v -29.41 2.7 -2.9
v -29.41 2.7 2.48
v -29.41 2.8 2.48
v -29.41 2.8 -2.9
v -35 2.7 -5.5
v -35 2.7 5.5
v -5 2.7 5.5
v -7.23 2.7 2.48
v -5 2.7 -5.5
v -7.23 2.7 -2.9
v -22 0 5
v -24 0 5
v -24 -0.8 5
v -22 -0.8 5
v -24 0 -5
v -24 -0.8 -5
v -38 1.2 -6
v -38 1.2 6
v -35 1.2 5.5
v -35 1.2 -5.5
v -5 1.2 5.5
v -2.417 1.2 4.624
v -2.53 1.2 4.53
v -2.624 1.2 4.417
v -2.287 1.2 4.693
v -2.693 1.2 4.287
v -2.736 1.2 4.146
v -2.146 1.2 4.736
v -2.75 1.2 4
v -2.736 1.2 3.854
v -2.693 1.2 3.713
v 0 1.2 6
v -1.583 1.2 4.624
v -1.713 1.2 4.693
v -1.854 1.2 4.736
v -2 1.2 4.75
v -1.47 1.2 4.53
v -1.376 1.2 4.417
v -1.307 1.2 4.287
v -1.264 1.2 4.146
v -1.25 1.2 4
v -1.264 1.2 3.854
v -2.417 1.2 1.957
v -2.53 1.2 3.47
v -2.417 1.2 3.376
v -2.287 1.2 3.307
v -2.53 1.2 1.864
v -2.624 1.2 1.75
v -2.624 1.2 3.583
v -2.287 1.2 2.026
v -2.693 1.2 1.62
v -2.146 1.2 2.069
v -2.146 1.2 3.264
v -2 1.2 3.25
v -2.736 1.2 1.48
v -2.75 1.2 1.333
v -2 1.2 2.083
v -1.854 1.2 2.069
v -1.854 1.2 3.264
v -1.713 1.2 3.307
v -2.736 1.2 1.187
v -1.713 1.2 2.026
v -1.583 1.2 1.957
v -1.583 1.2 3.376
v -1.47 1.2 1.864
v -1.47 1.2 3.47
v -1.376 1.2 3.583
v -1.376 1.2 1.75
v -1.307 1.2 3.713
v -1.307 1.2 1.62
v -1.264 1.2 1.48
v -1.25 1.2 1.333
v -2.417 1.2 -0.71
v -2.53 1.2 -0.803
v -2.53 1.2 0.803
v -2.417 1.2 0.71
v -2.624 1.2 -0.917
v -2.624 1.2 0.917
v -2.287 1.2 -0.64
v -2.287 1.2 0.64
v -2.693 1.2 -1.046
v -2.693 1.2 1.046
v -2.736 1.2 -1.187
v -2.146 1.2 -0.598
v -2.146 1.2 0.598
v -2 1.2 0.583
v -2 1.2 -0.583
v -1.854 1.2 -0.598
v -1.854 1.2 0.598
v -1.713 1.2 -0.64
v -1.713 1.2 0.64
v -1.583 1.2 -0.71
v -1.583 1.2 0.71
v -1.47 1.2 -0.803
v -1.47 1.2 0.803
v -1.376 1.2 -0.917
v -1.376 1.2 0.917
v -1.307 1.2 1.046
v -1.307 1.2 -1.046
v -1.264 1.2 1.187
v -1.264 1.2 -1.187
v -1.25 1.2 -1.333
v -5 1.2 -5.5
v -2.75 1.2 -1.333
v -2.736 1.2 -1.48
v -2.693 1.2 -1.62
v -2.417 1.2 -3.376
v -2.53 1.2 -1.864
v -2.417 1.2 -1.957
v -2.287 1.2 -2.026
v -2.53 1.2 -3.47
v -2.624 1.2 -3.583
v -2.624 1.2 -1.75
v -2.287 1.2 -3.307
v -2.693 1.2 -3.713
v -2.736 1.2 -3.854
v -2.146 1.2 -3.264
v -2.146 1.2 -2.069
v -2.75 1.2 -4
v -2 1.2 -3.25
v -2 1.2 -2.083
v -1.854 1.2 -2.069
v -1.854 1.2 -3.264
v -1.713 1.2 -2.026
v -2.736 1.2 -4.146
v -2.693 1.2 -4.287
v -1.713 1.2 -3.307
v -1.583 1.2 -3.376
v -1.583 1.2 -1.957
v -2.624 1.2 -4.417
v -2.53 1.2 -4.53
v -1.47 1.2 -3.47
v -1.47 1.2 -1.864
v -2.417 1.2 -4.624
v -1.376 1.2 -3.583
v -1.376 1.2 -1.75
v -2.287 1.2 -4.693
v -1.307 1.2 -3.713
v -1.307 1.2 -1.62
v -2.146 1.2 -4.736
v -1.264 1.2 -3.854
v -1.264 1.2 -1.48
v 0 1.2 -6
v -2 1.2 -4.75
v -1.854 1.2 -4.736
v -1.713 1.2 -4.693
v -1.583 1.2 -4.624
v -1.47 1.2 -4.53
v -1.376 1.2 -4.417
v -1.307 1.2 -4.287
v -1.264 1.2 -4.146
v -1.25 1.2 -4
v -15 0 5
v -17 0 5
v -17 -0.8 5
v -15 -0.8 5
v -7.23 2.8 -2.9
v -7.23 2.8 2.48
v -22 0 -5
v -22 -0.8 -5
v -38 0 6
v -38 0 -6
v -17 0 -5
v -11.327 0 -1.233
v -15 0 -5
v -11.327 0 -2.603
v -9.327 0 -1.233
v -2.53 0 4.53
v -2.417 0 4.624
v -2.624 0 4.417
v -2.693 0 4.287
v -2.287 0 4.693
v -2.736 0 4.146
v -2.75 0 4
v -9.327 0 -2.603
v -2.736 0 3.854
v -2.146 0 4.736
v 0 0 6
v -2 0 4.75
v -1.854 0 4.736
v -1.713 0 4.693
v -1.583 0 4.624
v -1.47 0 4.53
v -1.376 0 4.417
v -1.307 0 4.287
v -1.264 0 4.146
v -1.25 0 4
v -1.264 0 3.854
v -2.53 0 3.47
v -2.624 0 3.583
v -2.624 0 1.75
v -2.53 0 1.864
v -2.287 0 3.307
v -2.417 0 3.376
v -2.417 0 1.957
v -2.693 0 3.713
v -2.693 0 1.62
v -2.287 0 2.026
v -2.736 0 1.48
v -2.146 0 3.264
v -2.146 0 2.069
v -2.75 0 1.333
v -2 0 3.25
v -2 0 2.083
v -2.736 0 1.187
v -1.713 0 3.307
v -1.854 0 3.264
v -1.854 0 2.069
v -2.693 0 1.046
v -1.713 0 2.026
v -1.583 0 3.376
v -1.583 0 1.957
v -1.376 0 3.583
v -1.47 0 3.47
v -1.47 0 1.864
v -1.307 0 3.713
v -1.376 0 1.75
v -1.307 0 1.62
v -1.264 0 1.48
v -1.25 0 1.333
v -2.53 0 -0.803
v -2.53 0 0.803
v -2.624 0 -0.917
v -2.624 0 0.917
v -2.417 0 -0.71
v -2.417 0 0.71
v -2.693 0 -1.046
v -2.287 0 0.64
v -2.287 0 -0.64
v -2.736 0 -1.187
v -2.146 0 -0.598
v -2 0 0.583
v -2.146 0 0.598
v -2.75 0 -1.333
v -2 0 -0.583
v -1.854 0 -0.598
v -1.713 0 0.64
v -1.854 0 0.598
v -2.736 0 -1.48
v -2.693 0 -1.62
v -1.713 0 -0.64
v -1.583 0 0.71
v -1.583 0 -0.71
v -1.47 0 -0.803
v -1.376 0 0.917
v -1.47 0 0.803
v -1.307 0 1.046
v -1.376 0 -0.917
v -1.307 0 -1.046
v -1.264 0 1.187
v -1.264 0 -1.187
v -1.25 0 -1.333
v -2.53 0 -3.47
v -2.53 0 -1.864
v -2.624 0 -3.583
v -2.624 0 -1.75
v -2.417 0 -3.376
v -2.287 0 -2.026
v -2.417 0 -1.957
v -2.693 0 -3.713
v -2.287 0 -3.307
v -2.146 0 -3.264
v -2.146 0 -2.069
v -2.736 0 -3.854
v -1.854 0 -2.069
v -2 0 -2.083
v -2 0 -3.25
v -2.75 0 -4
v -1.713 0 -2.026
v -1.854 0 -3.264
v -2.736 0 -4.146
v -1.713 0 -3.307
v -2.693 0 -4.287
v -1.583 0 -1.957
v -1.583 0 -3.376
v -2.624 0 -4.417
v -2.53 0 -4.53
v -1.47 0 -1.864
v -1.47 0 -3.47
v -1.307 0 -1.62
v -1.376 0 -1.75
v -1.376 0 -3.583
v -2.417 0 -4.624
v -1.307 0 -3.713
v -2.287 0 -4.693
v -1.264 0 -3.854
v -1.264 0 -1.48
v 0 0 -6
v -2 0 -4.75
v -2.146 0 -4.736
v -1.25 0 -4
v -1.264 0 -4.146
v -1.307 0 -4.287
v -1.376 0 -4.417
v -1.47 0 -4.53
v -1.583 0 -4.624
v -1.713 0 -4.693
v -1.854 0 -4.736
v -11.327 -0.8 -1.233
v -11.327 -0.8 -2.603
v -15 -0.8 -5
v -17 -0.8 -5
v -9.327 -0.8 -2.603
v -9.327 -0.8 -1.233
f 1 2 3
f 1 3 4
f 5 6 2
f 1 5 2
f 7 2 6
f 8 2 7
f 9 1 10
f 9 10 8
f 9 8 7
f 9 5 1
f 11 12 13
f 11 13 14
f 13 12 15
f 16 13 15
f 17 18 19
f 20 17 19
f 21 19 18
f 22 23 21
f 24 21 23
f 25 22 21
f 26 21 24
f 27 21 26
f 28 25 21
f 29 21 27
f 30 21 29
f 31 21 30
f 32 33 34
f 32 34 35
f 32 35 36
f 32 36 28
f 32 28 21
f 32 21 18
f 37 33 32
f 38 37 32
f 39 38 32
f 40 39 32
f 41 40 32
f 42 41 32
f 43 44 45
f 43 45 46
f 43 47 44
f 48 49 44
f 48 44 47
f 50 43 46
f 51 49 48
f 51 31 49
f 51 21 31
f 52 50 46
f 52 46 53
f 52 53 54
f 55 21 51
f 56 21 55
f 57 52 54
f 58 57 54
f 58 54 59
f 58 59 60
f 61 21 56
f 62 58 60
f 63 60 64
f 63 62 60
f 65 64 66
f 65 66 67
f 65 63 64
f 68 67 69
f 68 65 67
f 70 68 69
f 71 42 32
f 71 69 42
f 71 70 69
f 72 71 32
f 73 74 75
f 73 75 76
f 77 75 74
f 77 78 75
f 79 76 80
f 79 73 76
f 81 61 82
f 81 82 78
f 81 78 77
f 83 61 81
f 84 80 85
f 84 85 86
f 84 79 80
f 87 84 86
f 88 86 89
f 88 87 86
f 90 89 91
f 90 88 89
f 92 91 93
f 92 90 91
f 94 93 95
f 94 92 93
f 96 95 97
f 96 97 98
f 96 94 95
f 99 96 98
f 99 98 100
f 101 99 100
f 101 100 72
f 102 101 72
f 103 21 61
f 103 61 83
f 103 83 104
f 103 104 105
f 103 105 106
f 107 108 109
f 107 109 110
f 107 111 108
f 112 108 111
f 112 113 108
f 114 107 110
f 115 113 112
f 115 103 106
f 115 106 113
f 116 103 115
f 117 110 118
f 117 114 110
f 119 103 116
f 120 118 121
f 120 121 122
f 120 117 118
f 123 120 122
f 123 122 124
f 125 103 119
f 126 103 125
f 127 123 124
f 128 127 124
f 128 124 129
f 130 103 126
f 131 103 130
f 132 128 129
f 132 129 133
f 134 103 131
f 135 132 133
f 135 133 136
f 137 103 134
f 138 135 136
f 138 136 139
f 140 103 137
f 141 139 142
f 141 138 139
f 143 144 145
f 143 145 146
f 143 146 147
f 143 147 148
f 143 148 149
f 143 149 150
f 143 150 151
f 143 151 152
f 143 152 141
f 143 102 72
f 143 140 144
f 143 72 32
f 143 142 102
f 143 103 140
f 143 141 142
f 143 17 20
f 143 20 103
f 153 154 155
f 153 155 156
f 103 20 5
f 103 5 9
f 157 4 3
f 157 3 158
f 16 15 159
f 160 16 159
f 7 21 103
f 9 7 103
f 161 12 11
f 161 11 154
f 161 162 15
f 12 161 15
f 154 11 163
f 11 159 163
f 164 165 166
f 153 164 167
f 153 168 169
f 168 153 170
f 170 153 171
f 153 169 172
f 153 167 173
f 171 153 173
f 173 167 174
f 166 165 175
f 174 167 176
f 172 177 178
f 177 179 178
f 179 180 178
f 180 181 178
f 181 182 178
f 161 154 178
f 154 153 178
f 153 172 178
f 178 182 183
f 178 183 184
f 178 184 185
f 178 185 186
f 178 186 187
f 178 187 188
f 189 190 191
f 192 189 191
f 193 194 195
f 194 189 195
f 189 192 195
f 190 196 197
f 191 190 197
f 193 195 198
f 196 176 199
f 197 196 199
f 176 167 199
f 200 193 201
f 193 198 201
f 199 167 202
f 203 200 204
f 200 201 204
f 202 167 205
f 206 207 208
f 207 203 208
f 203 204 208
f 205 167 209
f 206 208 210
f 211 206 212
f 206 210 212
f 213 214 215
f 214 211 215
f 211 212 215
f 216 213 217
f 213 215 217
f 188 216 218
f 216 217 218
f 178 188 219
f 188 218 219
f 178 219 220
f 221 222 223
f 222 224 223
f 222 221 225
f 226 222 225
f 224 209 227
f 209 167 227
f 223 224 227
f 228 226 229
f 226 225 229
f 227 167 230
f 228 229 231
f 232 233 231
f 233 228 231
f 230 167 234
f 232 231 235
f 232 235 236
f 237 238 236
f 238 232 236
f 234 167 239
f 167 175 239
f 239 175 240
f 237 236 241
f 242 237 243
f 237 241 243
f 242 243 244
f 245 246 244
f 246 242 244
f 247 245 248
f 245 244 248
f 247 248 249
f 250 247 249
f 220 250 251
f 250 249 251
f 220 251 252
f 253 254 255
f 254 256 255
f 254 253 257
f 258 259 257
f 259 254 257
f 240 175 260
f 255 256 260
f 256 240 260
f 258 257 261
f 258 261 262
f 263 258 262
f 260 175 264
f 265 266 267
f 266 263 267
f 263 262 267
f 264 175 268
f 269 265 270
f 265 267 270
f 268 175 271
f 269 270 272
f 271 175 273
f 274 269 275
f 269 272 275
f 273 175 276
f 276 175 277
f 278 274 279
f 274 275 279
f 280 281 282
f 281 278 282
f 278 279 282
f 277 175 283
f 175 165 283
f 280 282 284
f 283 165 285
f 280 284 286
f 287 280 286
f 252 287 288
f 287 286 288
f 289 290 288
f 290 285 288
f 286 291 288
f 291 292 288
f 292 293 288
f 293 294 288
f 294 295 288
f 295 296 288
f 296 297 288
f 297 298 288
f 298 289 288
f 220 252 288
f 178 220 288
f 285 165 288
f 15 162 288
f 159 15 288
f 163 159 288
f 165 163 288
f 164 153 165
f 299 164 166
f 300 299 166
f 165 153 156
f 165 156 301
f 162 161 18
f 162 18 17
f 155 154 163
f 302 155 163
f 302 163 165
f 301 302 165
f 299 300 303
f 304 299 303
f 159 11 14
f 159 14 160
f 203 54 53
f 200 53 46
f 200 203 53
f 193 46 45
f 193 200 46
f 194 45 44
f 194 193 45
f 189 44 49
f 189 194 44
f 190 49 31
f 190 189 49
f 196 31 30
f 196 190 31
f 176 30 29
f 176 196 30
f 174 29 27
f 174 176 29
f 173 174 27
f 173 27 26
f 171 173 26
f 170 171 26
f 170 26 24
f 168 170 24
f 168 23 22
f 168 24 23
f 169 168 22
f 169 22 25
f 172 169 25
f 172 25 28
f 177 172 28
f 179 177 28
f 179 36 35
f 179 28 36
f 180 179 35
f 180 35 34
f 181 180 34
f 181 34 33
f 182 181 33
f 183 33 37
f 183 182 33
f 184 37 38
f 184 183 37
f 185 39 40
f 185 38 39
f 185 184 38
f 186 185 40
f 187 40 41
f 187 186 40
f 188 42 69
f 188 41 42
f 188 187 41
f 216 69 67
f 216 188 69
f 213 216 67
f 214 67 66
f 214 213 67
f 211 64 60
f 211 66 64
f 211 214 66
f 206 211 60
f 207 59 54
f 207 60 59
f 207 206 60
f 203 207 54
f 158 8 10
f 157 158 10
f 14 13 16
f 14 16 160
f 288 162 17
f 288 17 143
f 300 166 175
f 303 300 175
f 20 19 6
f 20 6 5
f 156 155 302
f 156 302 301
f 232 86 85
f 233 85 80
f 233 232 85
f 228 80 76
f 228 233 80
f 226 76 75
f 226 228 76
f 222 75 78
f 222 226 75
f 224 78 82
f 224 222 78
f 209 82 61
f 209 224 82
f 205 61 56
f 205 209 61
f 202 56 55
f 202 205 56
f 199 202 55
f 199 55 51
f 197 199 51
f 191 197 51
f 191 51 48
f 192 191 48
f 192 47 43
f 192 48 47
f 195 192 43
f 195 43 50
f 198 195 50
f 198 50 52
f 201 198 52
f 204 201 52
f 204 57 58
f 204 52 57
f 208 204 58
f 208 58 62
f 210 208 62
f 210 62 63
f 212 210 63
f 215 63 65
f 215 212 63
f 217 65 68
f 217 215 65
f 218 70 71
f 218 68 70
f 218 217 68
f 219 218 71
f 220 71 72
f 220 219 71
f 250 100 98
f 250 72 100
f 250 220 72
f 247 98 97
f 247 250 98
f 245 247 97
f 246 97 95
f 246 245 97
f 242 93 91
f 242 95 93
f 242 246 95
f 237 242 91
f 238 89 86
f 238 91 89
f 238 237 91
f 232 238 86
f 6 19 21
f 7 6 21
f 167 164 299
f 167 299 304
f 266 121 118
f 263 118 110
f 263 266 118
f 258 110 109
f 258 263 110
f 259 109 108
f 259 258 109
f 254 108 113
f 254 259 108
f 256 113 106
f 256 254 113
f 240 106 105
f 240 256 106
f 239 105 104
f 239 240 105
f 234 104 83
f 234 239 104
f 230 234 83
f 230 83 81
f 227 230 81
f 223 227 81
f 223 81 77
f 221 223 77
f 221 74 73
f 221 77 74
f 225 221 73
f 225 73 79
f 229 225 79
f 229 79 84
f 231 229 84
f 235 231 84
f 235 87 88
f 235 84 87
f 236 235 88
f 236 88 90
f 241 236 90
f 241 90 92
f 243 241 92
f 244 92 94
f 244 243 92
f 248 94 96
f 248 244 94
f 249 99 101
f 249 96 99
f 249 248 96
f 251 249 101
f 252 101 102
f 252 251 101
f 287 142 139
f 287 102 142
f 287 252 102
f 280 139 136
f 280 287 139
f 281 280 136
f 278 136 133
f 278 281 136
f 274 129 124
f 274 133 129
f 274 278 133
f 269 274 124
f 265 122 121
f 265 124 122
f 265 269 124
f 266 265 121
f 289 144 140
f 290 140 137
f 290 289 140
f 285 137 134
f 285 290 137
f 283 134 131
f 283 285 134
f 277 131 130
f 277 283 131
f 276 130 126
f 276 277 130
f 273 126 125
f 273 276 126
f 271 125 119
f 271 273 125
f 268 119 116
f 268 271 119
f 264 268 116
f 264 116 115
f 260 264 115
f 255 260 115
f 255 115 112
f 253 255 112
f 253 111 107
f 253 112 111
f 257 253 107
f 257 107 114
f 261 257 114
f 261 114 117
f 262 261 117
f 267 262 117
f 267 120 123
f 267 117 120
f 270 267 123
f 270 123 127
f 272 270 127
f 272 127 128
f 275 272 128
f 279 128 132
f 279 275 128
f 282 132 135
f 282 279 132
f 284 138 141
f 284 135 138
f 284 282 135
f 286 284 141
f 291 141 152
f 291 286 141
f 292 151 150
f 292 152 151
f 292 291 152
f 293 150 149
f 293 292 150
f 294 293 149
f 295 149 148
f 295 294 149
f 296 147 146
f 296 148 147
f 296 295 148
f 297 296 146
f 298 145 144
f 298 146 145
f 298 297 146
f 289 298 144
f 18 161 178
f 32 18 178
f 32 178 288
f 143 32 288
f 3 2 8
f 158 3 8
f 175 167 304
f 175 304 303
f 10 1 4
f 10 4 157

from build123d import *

# Parameters (mm, degrees)
SKETCH_1_W          = 38
SKETCH_1_H          = 12
EXTRUDE_1_DEPTH     = 1.2
SKETCH_2_W          = 30
SKETCH_2_H          = 11
EXTRUDE_2_DEPTH     = 2.7
SKETCH_3_R          = 0.75
CUT_EXTRUDE_2_DEPTH = 39.565399
EXTRUDE_START       = 1.2
SKETCH_4_W          = 2
SKETCH_4_H          = 10
SKETCH_4_H_2        = 1.370131764
EXTRUDE_3_DEPTH     = 2
SKETCH_5_W          = 22.18
SKETCH_5_H          = 5.38
EXTRUDE_4_DEPTH     = 0.1


with BuildPart() as part:
    # Эскиз1 → Бобышка-Вытянуть1 (new body)
    with BuildSketch(Plane(origin=(0, 0, 0), x_dir=(1, 0, 0), z_dir=(0, 1, 0))):
        with Locations((-19, 0)):
            Rectangle(SKETCH_1_W, SKETCH_1_H)
    extrude(amount=EXTRUDE_1_DEPTH)

    # Эскиз2 → Бобышка-Вытянуть2 (add)
    with BuildSketch(Plane(origin=(0, 0, 0), x_dir=(1, 0, 0), z_dir=(0, 1, 0))):
        with Locations((-20, 0)):
            Rectangle(SKETCH_2_W, SKETCH_2_H)
    extrude(amount=EXTRUDE_2_DEPTH)

    # Эскиз3 → Вырез-Вытянуть2 (cut, through all)
    with BuildSketch(Plane(origin=(0, 0, 0), x_dir=(1, 0, 0), z_dir=(0, 1, 0))):
        with Locations(Location((-2, 4, 0), (0, 0, 90))):
            Circle(SKETCH_3_R)
        with Locations(Location((-2, 1.333333333, 0), (0, 0, 90))):
            Circle(SKETCH_3_R)
        with Locations(Location((-2, -1.333333333, 0), (0, 0, 90))):
            Circle(SKETCH_3_R)
        with Locations(Location((-2, -4, 0), (0, 0, 90))):
            Circle(SKETCH_3_R)
    extrude(amount=CUT_EXTRUDE_2_DEPTH, mode=Mode.SUBTRACT)

    # Эскиз4 → Бобышка-Вытянуть3 (add)
    with BuildSketch(Plane(origin=(0, 0, 0), x_dir=(1, 0, 0), z_dir=(0, 1, 0)).offset(EXTRUDE_START)):
        with Locations((-23, 0)):
            Rectangle(SKETCH_4_W, SKETCH_4_H)
        with Locations((-16, 0)):
            Rectangle(SKETCH_4_W, SKETCH_4_H)
        with Locations((-10.327262123, 1.918184469)):
            Rectangle(SKETCH_4_W, SKETCH_4_H_2)
    extrude(amount=-EXTRUDE_3_DEPTH)

    # Эскиз5 → Бобышка-Вытянуть4 (add)
    with BuildSketch(Plane(origin=(0, 2.7, 0), x_dir=(1, 0, 0), z_dir=(0, 1, 0))):
        with Locations((-18.32, 0.21)):
            Rectangle(SKETCH_5_W, SKETCH_5_H)
    extrude(amount=EXTRUDE_4_DEPTH)


solid = part.part
